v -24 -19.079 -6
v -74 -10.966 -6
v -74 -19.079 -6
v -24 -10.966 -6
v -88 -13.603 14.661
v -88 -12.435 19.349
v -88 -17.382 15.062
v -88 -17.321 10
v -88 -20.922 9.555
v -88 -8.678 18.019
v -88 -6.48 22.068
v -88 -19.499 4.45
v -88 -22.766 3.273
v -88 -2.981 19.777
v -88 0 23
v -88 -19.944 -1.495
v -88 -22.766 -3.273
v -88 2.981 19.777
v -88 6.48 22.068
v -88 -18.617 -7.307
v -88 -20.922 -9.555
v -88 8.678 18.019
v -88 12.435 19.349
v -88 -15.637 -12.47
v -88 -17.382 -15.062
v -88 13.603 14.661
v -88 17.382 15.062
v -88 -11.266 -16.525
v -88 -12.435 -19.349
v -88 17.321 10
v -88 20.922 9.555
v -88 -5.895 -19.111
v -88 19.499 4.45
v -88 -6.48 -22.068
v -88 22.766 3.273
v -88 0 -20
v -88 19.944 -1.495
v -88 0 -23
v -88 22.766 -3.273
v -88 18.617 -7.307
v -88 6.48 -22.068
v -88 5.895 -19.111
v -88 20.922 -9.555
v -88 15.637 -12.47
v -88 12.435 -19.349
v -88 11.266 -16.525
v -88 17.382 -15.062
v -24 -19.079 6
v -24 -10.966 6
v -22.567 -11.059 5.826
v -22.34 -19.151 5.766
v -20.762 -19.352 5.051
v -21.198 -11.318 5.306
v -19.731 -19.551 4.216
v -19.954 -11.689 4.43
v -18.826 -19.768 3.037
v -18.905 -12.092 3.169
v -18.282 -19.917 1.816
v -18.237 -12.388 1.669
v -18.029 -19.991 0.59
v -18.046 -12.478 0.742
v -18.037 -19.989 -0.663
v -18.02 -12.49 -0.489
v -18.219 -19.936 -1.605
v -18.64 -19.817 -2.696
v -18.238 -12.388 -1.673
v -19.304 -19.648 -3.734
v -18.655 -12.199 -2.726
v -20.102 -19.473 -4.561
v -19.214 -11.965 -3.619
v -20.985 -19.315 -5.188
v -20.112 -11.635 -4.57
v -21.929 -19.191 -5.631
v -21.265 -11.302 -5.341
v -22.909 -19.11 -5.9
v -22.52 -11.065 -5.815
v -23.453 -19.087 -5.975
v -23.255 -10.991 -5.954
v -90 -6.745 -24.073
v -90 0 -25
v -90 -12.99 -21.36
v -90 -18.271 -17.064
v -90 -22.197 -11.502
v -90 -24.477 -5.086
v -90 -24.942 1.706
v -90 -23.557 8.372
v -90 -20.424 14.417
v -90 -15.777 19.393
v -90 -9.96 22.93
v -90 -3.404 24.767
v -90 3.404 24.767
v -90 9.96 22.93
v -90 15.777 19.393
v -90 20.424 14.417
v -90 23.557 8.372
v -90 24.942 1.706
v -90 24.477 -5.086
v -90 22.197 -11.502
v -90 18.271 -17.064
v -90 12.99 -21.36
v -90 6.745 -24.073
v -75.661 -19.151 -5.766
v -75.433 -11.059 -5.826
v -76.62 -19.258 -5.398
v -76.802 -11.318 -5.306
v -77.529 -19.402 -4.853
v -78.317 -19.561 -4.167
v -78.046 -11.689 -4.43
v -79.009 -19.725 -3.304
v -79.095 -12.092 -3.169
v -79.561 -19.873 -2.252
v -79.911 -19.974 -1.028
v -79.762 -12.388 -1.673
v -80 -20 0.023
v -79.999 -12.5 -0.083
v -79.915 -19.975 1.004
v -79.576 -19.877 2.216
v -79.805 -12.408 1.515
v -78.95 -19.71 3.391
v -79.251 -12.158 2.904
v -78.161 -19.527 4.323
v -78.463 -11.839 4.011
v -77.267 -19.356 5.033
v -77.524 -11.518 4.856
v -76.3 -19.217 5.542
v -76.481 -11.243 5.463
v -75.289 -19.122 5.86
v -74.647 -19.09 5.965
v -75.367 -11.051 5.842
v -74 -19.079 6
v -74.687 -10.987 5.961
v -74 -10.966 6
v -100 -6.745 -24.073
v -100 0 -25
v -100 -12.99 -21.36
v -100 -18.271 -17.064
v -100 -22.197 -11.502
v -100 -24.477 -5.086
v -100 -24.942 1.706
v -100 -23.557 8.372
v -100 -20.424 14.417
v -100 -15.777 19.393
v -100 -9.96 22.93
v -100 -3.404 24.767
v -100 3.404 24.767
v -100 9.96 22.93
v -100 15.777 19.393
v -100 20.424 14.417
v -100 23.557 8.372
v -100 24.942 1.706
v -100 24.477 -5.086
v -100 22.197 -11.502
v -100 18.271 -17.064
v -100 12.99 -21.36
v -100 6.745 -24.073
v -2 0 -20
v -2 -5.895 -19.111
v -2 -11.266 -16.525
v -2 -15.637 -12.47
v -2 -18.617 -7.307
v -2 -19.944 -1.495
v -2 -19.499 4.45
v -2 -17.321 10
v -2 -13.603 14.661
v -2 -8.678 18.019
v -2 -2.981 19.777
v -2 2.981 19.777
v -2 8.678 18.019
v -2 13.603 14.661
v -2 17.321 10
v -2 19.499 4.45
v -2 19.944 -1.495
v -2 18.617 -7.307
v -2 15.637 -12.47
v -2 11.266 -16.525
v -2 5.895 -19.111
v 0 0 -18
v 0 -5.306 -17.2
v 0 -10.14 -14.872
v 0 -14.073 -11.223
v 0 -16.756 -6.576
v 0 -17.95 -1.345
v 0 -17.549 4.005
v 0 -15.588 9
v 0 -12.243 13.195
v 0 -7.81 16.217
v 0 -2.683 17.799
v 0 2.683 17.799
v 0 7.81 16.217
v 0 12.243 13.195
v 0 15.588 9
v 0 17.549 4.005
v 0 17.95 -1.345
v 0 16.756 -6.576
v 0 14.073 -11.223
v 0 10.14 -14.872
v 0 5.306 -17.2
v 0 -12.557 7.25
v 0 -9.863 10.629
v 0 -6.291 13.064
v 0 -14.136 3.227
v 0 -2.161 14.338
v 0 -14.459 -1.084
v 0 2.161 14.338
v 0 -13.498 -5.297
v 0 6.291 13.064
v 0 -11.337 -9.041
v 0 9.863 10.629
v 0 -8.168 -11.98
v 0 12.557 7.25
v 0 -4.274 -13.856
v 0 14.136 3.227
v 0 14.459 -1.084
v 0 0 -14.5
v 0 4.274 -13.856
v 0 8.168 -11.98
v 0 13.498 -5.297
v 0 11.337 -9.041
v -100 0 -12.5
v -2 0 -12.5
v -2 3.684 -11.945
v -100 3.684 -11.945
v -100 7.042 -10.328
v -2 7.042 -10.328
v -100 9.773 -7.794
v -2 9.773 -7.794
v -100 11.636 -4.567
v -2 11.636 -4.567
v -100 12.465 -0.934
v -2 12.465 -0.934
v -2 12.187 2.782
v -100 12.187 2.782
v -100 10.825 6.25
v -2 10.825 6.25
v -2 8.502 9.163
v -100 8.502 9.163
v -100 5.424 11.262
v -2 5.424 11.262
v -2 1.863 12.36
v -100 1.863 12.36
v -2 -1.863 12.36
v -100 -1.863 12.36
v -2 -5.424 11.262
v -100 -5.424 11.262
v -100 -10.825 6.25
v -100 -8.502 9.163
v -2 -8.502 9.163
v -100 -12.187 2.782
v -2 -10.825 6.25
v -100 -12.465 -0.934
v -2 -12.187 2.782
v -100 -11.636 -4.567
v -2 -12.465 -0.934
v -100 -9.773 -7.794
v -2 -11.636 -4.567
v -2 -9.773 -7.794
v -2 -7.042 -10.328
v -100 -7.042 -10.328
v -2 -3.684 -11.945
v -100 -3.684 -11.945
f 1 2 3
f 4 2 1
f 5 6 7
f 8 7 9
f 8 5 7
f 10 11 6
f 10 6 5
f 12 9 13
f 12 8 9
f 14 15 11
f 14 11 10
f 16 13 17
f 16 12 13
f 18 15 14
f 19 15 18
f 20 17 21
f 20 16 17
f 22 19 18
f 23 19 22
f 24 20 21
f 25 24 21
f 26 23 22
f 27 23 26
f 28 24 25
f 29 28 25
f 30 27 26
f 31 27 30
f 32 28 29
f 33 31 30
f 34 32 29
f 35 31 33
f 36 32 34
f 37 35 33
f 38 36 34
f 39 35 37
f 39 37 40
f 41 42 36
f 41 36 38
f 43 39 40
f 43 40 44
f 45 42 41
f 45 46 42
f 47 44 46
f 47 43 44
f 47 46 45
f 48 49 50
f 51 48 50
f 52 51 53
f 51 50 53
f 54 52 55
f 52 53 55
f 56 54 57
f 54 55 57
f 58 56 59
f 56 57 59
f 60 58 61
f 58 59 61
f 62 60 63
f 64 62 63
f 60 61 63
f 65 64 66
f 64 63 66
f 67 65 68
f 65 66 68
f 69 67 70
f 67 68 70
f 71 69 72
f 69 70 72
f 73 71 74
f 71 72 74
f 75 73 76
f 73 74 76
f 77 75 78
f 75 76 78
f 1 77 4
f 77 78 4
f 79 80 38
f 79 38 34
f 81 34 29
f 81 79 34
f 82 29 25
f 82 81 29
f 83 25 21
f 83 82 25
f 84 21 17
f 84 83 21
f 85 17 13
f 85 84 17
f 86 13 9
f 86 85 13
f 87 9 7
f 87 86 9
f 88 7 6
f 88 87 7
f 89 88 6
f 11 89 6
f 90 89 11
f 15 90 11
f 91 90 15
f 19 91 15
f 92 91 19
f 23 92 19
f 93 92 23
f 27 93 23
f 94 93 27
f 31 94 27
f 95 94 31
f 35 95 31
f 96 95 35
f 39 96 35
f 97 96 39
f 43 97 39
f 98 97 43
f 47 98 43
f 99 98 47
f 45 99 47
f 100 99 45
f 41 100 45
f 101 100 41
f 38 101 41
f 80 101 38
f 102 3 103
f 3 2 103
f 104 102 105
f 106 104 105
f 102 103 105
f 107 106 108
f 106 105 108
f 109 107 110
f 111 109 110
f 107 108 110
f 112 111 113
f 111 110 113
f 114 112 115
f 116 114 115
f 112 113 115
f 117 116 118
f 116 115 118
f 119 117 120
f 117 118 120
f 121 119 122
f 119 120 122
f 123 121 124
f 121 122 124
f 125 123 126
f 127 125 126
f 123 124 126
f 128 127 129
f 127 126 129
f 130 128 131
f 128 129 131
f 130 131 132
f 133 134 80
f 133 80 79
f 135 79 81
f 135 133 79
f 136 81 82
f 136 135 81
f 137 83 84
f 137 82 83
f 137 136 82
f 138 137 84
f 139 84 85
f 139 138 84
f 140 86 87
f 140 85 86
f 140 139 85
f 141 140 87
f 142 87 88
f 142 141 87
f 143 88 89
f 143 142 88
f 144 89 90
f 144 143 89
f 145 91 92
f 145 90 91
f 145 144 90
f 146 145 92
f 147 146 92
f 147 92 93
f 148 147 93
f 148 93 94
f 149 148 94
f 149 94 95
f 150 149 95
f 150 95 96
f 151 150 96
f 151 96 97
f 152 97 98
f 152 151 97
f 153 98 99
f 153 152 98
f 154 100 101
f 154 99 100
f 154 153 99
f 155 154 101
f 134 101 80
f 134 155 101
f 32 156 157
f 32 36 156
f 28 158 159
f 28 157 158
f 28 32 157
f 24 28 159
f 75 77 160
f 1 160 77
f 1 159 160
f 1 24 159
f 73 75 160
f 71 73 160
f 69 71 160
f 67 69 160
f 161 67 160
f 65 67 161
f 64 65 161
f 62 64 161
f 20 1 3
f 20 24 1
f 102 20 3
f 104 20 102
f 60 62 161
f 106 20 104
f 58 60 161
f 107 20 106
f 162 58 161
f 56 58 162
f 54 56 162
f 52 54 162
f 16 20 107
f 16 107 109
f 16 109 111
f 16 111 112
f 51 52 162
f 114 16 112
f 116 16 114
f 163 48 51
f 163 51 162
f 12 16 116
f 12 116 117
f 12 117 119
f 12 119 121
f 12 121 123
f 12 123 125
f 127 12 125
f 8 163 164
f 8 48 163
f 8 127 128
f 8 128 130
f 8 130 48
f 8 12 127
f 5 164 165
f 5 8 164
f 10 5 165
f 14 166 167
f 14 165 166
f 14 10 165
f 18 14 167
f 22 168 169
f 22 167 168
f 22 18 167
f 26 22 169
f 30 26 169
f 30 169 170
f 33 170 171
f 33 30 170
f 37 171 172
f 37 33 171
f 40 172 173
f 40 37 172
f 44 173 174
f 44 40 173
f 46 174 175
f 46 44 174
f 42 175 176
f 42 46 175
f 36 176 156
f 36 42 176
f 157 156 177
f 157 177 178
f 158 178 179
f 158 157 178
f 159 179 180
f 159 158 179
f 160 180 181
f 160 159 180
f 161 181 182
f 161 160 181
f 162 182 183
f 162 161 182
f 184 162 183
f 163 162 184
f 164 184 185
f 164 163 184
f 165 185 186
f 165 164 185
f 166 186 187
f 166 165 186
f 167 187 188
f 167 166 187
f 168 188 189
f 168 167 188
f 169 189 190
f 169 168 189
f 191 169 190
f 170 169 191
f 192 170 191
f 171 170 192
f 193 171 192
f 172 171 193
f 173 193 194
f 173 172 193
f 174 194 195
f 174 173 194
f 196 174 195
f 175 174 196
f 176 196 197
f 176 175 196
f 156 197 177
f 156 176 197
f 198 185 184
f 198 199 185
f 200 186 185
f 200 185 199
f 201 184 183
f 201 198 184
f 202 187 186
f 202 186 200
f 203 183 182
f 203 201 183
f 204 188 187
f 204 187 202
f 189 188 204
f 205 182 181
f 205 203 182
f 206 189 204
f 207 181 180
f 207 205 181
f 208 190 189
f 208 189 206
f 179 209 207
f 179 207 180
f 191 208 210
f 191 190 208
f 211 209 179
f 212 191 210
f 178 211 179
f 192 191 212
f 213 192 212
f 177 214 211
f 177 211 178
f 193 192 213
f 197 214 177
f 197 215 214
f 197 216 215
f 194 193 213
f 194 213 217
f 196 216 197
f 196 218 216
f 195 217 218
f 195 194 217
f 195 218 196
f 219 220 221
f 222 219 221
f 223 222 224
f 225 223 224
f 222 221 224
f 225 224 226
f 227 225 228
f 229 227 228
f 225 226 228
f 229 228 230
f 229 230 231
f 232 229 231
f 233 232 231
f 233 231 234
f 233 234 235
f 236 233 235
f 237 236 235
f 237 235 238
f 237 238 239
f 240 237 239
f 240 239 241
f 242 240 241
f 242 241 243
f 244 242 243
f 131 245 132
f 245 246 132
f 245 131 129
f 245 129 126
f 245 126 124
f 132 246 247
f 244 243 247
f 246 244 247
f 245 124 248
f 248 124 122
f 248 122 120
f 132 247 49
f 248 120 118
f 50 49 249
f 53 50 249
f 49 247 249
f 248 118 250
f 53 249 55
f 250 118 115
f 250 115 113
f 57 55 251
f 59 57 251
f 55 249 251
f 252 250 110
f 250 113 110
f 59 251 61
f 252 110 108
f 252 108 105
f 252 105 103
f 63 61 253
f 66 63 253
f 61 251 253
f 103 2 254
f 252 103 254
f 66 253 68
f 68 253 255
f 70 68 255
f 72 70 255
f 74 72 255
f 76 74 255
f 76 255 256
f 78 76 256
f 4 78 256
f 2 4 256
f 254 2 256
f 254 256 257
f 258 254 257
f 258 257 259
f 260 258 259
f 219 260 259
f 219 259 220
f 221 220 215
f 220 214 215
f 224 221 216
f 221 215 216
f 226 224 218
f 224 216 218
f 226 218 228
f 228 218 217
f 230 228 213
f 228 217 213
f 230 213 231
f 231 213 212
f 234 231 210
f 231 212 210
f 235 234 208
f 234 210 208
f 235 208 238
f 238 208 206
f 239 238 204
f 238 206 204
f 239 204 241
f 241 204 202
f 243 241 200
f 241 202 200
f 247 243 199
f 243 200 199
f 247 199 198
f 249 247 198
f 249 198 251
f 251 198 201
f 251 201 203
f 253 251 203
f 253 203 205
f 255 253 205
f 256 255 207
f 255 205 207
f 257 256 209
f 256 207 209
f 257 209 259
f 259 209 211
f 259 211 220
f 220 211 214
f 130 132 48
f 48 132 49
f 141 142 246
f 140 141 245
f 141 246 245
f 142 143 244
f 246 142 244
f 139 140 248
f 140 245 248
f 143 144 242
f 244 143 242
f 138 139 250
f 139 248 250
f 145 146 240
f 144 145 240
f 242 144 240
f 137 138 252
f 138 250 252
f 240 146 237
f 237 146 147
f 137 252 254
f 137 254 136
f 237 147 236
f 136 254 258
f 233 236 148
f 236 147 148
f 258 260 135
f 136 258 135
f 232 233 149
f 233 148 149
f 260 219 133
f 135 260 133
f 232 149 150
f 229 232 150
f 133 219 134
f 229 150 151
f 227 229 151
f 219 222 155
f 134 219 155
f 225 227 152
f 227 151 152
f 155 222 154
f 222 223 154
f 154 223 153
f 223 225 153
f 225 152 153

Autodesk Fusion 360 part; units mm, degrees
sketch "Sketch1" plane through (0, 0, 0) normal (0, 1, 0) x (1, 0, 0)
  line L0 (-100, 12.5) -> (-2, 12.5)
  line L1 (-2, 12.5) -> (0, 14.5)
  line L2 (0, 14.5) -> (0, 18)
  line L3 (0, 18) -> (-2, 20)
  line L4 (-2, 20) -> (-88, 20)
  line L5 (-88, 20) -> (-88, 23)
  line L6 (-88, 23) -> (-90, 25)
  line L7 (-90, 25) -> (-100, 25)
  line L8 (-100, 25) -> (-100, 12.5)
  line L9 (0, 0) -> (-74, 0) construction
  line L10 (-74, -6) -> (-24, -6)
  line L11 (-74, 6) -> (-24, 6)
  arc A0 (-74, 6) -> (-74, -6) centre (-74, 0) ccw
  arc A1 (-24, -6) -> (-24, 6) centre (-24, 0) ccw
  dimension "d1" = 88
  dimension "d2" = 100
  dimension "d3" = 135
  dimension "d4" = 25
  dimension "d5" = 20
  dimension "d6" = 100
  dimension "d7" = 14.5
  dimension "d8" = 135
  dimension "d9" = 45
  dimension "d10" = 2
  dimension "d11" = 2
  dimension "d12" = 90
  dimension "d13" = 12
  dimension "d15" = 12
  dimension "d16" = 24
  dimension "d17" = 74
revolve "Revolve1" add sketch "Sketch1" angle 360 about axis through (1.75, 0, 0) along (1, 0, 0) contours L0 L1 L2 L3 L4 L5 L6 L7 L8
extrude "Extrude1" cut sketch "Sketch1" against normal through all contours L10 L11 A0 A1
equation "d3 = 180 deg - 45 deg"
equation "d4 = ( 50 / 2 ) * 1 mm"
equation "d5 = ( 40 / 2 ) * 1 mm"
equation "d6 = d2"
equation "d7 = ( 29 / 2 ) * 1 mm"
equation "d12 = d1 + 2 mm"
equation "d17 = d16 + 50 mm"
